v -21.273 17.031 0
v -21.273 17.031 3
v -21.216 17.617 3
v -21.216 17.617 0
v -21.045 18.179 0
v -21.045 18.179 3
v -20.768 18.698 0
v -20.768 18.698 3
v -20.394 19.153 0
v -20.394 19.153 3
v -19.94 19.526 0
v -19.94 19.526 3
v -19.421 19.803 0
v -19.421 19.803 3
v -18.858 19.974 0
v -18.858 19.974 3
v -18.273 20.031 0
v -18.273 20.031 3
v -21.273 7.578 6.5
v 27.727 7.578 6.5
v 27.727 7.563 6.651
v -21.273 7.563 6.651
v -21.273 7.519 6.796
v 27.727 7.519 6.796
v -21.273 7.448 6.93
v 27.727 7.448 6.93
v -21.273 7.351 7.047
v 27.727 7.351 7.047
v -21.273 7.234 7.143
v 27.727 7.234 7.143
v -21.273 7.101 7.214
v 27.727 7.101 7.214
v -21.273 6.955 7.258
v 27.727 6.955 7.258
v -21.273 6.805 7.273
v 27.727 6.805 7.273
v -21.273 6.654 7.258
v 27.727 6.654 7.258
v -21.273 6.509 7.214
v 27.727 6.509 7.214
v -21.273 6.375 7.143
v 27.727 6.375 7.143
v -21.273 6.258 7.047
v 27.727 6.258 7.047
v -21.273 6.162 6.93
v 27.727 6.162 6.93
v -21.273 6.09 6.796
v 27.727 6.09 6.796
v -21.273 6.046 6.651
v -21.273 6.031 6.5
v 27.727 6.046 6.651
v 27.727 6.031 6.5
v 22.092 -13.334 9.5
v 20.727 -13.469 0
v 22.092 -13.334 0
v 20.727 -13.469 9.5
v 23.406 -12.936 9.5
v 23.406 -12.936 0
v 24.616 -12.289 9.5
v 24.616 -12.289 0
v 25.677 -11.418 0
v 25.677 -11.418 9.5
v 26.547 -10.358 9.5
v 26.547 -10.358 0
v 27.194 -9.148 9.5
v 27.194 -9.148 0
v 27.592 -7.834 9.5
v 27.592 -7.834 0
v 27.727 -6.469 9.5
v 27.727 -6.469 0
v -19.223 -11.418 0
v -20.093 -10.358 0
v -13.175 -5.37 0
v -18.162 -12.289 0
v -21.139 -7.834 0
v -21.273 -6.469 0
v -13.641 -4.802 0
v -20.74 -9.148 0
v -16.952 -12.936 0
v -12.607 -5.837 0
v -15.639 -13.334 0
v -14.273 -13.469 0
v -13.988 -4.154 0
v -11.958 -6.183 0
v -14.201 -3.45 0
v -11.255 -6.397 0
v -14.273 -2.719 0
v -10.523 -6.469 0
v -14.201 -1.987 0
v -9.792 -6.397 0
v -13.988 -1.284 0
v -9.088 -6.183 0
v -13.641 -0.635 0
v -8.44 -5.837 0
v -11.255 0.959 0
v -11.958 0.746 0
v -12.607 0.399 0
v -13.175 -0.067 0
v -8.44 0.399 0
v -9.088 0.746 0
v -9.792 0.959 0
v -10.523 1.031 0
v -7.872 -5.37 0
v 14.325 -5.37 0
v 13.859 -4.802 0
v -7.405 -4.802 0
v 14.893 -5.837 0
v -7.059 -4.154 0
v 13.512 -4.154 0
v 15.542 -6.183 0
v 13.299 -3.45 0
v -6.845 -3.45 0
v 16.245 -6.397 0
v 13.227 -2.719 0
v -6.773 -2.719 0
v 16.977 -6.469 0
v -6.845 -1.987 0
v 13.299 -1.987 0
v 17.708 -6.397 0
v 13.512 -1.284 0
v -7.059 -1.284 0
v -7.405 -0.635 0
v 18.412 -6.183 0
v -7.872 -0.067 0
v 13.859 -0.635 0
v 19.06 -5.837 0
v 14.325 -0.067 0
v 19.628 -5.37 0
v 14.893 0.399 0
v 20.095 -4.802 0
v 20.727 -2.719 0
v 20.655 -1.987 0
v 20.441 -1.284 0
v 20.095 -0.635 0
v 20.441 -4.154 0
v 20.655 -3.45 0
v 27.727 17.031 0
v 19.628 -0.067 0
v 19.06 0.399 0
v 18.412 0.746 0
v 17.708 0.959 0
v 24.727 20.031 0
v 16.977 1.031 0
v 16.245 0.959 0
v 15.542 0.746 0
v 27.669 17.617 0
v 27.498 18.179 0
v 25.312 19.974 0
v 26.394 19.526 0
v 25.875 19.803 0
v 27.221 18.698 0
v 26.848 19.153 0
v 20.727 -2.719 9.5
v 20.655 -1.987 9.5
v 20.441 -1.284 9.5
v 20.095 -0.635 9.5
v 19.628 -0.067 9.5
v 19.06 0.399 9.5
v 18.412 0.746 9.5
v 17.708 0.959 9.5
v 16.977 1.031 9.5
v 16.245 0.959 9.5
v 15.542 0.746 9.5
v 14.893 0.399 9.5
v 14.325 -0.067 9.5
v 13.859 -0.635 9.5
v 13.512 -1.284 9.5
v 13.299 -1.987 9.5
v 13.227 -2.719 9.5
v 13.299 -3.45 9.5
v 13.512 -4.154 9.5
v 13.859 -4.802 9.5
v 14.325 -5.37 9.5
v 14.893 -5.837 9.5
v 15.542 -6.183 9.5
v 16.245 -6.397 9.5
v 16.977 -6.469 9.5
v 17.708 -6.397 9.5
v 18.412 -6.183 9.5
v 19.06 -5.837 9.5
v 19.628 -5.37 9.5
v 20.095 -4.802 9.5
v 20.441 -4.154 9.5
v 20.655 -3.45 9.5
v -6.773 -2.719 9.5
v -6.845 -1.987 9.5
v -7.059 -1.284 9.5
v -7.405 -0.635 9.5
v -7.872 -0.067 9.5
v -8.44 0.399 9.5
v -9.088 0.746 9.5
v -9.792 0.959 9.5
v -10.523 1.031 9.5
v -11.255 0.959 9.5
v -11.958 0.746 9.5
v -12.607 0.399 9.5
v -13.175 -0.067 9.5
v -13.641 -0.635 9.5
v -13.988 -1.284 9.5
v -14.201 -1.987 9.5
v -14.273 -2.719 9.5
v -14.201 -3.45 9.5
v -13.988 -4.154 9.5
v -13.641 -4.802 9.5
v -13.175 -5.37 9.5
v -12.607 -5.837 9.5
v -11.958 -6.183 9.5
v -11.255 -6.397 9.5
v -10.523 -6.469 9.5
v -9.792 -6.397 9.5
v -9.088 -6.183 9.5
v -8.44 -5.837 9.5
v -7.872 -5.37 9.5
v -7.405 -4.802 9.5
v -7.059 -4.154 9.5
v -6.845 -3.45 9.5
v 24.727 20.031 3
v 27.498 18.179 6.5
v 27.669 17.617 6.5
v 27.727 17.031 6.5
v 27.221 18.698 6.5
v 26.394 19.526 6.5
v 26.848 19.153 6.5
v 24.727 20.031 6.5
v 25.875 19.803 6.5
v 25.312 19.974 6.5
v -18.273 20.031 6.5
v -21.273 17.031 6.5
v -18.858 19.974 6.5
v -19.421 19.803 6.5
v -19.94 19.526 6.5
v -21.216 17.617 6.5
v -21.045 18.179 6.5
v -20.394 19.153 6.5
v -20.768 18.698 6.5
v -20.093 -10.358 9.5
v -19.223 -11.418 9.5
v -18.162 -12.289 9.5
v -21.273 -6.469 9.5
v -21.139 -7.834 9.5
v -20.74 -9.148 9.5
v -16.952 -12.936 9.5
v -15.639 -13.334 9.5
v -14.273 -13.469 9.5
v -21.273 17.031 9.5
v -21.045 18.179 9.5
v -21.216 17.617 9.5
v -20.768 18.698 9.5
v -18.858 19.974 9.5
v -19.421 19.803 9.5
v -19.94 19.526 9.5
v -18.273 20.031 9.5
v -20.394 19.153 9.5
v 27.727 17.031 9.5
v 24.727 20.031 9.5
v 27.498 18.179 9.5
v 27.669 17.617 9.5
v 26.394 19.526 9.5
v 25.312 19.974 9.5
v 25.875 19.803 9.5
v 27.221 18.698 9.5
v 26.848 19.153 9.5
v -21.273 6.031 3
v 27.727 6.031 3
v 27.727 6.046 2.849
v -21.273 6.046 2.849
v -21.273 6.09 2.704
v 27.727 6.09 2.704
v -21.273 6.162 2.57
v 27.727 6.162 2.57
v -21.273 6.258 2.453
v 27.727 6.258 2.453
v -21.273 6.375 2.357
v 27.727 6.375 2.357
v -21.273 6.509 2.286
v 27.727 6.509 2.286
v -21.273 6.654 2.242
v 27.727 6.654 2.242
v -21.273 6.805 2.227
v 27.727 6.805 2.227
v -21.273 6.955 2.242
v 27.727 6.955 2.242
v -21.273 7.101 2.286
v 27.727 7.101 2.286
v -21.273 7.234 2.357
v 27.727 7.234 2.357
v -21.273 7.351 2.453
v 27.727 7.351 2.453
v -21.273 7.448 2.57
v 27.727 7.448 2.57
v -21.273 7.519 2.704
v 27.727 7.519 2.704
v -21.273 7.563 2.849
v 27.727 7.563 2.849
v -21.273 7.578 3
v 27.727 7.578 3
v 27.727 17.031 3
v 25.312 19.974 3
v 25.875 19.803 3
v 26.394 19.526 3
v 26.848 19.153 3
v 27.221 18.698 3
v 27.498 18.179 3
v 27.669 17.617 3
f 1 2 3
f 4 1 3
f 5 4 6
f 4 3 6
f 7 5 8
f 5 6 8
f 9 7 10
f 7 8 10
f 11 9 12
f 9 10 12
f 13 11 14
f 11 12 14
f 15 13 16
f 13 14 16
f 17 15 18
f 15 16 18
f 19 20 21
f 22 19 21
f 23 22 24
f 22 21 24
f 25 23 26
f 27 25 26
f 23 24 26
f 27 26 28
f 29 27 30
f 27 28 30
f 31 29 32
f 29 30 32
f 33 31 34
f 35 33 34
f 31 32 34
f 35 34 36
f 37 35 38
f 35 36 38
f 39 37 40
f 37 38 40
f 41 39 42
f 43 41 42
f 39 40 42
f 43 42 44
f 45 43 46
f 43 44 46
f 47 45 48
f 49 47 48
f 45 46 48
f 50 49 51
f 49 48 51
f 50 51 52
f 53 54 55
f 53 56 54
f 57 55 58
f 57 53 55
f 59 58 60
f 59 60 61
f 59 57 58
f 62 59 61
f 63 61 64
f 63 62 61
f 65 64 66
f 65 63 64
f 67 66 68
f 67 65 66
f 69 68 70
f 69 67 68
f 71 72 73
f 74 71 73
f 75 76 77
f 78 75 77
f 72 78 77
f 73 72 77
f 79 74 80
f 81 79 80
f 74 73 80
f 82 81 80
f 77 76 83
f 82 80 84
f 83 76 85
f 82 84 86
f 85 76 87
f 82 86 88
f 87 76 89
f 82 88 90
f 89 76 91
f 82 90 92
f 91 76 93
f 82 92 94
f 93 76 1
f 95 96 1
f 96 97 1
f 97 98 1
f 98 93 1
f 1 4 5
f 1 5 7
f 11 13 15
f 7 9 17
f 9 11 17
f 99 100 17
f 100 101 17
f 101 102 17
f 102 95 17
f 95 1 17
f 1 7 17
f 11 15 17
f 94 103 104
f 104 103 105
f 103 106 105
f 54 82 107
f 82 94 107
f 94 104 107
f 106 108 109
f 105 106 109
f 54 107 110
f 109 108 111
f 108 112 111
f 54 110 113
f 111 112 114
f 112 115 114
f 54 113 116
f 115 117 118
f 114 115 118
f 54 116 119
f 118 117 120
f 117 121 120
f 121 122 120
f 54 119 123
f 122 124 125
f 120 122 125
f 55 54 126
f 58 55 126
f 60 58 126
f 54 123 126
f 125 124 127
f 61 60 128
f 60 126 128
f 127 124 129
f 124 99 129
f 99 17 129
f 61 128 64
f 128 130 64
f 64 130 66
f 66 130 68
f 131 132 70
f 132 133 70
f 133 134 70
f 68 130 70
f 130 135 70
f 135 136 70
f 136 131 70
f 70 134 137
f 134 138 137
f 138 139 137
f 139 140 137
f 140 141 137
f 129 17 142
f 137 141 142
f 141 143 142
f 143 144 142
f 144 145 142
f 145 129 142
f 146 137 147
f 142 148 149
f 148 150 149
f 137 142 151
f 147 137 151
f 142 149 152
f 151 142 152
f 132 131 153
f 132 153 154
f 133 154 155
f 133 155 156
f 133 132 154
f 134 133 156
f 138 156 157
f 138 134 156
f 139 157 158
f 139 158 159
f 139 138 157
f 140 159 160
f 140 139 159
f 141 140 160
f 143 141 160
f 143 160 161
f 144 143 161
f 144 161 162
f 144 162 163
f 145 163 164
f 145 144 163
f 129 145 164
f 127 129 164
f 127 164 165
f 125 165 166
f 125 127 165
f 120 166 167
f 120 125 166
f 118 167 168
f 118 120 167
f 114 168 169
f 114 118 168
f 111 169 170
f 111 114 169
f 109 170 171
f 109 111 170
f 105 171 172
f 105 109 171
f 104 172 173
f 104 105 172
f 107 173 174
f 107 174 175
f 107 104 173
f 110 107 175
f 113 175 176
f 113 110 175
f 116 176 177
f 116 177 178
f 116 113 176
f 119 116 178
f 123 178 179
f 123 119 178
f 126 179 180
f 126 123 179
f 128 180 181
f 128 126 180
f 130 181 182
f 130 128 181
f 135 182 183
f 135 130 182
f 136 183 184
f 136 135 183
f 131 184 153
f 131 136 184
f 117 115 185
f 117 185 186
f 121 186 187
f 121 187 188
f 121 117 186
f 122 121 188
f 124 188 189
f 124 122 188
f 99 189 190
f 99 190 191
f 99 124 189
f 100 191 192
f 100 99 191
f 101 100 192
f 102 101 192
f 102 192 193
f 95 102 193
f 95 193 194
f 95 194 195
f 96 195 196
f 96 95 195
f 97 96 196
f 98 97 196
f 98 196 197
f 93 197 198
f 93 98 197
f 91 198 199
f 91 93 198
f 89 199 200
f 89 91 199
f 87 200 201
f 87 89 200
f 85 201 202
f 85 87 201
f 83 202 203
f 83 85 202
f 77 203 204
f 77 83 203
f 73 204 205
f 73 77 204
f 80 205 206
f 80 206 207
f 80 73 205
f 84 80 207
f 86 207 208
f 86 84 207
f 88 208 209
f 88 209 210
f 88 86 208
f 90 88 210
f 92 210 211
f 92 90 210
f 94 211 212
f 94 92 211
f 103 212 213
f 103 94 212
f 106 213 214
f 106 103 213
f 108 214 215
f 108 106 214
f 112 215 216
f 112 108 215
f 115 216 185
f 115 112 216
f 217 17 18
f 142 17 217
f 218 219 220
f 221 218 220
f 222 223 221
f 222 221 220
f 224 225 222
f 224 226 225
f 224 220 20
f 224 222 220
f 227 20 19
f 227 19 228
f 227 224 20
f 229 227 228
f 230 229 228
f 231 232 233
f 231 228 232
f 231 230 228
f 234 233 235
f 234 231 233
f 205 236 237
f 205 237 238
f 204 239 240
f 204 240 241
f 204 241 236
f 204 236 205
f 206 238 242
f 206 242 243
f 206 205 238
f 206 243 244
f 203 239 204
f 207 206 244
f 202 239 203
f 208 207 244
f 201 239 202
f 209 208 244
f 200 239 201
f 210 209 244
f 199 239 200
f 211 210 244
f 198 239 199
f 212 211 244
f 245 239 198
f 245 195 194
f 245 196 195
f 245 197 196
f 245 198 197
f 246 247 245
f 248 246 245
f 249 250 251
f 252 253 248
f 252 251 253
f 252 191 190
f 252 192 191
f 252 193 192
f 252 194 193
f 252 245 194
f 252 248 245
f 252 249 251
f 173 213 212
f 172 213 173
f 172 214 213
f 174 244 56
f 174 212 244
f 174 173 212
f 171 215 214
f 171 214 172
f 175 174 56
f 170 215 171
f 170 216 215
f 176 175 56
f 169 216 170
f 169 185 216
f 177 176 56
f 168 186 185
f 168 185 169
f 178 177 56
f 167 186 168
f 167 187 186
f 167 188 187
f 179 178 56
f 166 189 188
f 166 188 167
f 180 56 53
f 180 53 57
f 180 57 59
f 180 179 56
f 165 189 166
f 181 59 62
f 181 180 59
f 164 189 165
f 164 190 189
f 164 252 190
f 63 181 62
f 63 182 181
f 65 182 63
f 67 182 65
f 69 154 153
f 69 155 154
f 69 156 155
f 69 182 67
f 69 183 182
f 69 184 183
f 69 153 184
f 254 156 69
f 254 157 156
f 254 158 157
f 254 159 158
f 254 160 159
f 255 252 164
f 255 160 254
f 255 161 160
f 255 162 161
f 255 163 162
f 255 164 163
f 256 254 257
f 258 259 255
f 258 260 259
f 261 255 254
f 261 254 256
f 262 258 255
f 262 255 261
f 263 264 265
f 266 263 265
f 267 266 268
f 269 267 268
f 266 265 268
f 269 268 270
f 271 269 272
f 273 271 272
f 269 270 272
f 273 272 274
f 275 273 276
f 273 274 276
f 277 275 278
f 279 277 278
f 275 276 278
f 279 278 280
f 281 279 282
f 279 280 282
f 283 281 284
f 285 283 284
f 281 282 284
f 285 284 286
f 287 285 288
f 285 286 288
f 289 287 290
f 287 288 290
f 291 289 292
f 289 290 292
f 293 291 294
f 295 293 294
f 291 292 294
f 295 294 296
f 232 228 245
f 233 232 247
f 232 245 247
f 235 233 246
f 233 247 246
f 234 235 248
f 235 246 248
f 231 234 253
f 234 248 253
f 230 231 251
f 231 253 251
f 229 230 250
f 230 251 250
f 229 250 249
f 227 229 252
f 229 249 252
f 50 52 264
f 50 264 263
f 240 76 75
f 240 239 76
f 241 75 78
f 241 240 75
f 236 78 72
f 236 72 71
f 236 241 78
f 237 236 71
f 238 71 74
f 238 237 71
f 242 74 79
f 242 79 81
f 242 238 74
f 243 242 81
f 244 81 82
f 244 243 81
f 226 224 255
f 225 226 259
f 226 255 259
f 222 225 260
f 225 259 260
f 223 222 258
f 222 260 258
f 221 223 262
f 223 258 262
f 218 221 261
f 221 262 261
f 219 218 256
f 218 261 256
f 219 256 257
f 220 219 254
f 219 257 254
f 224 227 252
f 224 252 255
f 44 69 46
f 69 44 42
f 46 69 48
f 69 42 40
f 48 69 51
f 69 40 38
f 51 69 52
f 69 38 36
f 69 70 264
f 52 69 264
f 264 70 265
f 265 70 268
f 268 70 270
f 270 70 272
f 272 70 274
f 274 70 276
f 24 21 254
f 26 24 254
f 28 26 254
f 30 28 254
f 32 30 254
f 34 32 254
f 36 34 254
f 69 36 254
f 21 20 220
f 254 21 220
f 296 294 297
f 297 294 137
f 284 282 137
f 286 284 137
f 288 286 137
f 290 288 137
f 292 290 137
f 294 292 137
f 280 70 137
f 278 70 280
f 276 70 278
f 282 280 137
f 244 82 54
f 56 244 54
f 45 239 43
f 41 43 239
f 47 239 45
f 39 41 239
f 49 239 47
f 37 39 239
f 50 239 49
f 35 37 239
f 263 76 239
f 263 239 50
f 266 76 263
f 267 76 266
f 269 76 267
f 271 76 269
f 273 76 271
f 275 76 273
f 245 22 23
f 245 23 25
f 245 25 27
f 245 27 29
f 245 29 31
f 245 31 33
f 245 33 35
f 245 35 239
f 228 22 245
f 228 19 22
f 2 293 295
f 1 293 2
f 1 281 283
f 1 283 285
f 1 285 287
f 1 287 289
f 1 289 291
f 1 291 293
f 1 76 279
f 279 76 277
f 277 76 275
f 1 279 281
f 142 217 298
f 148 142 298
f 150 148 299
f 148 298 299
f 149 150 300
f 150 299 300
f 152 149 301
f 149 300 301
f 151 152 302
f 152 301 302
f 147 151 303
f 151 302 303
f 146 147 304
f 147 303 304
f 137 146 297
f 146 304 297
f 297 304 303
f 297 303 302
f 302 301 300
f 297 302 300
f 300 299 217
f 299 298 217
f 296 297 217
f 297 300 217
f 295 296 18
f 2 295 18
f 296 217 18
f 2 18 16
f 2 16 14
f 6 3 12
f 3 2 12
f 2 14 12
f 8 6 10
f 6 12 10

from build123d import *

# Parameters (mm, degrees)
F0_W     = 49
F0_H     = 33.5
F0_R     = 3.75
F1_DEPTH = 9.5
F2_R     = 7
F4_R     = 3
F3_W     = 49
F3_H     = 3.5
F5_DEPTH = 14
F7_DEPTH = 50


with BuildPart() as f1:
    # F0 (on Top) → F1 (new body)
    with BuildSketch(Plane.XY):
        with Locations((3.22683, 3.281258)):
            Rectangle(F0_W, F0_H)
        with Locations((-10.52317, -2.718742)):
            Circle(F0_R, mode=Mode.SUBTRACT)
        with Locations((16.97683, -2.718742)):
            Circle(F0_R, mode=Mode.SUBTRACT)
    extrude(amount=F1_DEPTH)

    # F2
    f2_edges = [f1.edges().sort_by_distance(p)[0] for p in [
        (-21.27317, -13.468742, 4.75),
        (27.72683, -13.468742, 4.75),
    ]]
    fillet(f2_edges, radius=F2_R)

    # F4
    f4_edges = [f1.edges().sort_by_distance(p)[0] for p in [
        (27.72683, 20.031258, 4.75),
        (-21.27317, 20.031258, 4.75),
    ]]
    fillet(f4_edges, radius=F4_R)

    # F3 (on face) → F5 (cut)
    with BuildSketch(Plane(origin=(0, 20.031258, 0), x_dir=(-1, 0, 0), z_dir=(0, 1, 0))):
        with Locations((-3.22683, 4.75)):
            Rectangle(F3_W, F3_H)
    extrude(amount=-F5_DEPTH, mode=Mode.SUBTRACT)

    # F6 (on face) → F7 (cut)
    with BuildSketch(Plane.YZ.offset(27.72683)):
        with BuildLine():
            ThreePointArc((7.577891, 6.5), (6.804574, 7.273316), (6.031258, 6.5))
            Line((6.031258, 6.5), (7.577891, 6.5))
        make_face()
        with BuildLine():
            Line((7.577891, 3), (6.031258, 3))
            ThreePointArc((6.031258, 3), (6.804574, 2.226684), (7.577891, 3))
        make_face()
    extrude(amount=-F7_DEPTH, mode=Mode.SUBTRACT)


solid = f1.part
